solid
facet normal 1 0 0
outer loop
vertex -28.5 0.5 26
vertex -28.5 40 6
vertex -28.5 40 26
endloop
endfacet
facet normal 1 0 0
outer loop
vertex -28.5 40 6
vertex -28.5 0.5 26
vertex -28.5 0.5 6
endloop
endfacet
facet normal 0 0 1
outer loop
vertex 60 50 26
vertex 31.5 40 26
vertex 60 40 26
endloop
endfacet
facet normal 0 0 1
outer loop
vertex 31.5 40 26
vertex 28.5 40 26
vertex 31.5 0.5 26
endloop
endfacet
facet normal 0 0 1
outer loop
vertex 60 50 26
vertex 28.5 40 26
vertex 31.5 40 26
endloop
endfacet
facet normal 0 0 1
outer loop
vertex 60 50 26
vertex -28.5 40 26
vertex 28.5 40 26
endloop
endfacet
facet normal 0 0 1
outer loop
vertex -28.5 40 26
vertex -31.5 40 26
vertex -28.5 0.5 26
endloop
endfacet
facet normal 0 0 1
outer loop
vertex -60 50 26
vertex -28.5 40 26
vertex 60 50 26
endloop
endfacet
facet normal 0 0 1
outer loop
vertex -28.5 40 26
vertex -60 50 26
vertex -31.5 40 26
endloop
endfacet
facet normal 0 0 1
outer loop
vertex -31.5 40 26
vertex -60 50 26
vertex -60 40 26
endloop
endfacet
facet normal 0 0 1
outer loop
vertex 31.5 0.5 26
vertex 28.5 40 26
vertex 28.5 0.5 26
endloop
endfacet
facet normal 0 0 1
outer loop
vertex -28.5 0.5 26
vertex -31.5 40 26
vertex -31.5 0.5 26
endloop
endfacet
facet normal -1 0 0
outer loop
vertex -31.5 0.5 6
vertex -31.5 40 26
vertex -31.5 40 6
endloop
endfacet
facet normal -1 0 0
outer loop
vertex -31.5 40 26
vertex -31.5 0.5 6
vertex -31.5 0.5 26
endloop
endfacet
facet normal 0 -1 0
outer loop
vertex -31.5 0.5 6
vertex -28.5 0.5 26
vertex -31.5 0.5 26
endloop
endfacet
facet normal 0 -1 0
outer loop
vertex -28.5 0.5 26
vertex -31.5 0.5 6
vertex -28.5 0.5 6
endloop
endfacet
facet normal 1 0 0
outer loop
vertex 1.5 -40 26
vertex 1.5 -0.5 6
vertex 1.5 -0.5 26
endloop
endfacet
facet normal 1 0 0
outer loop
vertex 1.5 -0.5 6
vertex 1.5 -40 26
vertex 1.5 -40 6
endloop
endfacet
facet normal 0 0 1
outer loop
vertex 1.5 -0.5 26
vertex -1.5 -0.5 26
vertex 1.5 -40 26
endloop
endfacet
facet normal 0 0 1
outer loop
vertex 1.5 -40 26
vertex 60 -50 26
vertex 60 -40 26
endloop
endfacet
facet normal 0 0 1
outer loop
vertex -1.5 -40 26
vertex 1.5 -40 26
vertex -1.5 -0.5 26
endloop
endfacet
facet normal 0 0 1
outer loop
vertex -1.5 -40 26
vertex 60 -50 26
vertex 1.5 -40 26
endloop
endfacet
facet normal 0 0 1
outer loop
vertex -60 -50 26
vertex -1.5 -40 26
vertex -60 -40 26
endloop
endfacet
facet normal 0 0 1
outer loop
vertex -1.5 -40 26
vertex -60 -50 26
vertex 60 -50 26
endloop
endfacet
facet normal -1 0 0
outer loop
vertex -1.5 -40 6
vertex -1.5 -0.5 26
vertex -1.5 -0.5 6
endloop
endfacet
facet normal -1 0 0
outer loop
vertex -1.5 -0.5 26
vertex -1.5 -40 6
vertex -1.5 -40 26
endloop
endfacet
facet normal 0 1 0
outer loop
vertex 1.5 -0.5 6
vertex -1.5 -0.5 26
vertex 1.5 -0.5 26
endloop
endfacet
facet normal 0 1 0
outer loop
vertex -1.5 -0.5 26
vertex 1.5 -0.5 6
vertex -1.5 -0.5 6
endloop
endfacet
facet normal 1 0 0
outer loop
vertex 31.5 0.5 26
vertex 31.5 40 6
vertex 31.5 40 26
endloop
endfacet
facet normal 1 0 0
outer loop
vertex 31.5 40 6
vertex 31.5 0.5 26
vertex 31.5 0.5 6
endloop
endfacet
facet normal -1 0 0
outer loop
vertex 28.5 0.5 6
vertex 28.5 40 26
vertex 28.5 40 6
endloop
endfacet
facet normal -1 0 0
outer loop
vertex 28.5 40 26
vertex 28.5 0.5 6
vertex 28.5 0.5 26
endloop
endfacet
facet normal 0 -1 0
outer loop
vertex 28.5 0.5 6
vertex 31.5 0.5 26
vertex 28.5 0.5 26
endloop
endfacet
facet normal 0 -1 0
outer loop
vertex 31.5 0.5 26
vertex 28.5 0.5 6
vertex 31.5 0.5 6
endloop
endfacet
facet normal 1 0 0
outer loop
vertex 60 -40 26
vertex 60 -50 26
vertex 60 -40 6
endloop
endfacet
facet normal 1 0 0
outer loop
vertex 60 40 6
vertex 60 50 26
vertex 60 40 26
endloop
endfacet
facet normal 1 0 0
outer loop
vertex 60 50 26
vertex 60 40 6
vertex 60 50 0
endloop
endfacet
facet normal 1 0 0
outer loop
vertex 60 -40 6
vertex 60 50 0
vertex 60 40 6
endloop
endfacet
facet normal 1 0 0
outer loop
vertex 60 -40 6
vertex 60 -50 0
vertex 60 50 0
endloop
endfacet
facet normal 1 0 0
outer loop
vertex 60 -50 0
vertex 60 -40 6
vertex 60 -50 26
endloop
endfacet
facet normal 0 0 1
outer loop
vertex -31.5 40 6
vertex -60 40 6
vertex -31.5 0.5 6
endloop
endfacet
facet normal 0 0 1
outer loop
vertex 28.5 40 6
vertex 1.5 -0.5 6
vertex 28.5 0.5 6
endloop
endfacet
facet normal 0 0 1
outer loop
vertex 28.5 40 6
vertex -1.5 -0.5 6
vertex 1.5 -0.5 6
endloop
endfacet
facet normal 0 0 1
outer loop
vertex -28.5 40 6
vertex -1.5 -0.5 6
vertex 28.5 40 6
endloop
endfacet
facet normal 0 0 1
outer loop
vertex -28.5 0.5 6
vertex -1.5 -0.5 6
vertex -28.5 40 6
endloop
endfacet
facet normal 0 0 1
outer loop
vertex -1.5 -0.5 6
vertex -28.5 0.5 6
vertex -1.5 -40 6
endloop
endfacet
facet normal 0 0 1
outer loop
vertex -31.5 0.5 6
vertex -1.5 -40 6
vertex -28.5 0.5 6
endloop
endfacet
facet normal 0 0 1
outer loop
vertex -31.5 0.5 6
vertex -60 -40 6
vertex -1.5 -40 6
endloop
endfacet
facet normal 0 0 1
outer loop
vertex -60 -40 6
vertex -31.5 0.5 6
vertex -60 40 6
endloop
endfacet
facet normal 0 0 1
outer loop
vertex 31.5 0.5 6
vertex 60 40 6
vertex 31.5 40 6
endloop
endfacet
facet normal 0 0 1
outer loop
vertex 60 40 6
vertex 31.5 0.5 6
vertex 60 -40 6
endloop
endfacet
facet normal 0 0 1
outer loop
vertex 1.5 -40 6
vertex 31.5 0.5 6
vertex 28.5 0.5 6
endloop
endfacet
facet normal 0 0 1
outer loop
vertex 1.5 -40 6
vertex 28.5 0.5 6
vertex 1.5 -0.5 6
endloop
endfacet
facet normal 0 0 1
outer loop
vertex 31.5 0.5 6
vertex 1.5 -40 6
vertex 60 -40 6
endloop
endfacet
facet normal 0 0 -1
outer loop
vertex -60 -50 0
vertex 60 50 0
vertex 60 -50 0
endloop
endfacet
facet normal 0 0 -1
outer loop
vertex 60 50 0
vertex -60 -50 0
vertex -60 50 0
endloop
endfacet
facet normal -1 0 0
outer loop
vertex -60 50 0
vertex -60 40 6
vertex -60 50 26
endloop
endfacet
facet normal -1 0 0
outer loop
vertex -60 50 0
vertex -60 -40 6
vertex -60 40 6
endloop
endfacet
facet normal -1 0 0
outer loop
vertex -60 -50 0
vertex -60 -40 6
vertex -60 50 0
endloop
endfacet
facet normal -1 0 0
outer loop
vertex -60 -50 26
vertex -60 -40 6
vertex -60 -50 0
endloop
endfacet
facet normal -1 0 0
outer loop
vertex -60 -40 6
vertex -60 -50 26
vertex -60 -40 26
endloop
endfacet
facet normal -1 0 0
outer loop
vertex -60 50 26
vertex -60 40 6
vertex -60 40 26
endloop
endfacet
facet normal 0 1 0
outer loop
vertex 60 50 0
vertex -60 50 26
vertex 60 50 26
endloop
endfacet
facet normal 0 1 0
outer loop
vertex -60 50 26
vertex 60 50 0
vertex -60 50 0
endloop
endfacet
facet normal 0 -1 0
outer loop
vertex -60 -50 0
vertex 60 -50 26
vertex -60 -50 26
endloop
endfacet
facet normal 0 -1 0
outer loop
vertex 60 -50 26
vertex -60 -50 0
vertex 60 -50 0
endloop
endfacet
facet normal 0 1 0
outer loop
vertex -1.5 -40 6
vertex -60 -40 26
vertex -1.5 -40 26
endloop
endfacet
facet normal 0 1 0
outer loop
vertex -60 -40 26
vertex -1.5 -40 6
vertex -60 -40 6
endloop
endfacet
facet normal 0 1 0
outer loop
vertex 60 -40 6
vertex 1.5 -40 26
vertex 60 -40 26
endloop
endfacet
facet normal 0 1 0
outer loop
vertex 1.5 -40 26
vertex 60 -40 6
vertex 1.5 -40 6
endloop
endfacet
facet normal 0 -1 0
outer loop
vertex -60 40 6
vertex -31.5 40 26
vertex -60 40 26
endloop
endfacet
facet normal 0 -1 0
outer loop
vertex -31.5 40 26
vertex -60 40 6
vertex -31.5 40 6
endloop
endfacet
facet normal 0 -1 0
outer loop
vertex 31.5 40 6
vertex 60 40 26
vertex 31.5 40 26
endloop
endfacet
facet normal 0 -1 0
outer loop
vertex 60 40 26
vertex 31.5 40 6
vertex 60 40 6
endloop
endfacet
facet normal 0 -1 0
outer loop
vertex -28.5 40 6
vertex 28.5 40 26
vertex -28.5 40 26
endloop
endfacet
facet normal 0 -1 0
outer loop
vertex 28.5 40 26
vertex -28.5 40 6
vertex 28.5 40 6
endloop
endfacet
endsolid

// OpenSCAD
$fn = 32;

// ----------------------------------------------------------------------
// Rib frame 120 x 100 x 26
// 3 ribs at 30 mm pitch, staggered
// ----------------------------------------------------------------------

// --- parameters (mm) ---
frame = [120, 100, 6];  // base plate size (x, y, z)
rail_w = 10;            // side rail width
ribs = 3;               // number of ribs
rib_t = 3;              // rib thickness
rib_h = 20;             // rib height above the base plate
pitch = 30;             // pitch between rib centres

// --- derived feature positions (mm) ---
span = (ribs - 1) * pitch;          // = 60   distance between the outer ribs
origin_x = -span / 2;               // = -30   X of the first rib
rib_len = frame[1] / 2 - rail_w + 0.5;  // = 40.5   length of a staggered rib
rib_y = 0.5 + rib_len / 2;          // = 20.75   Y of a staggered rib centre
row_offset = 2 * rib_y;             // = 41.5   distance between the two rows
feature_centers = [
  [origin_x + 0 * pitch, rib_y],
  [origin_x + 1 * pitch, -rib_y],
  [origin_x + 2 * pitch, rib_y]
];   // rib centre line, drives the rib loop

// base plate, two side rails, then the ribs read straight off feature_centers
union() {
  translate([-frame[0] / 2, -frame[1] / 2, 0]) cube(frame);
  translate([-frame[0] / 2, -frame[1] / 2, 0]) cube([frame[0], rail_w, frame[2] + rib_h]);
  translate([-frame[0] / 2, frame[1] / 2 - rail_w, 0]) cube([frame[0], rail_w, frame[2] + rib_h]);
  for (centre = feature_centers)
    translate([centre[0] - rib_t / 2, centre[1] - rib_len / 2, frame[2] - 1])
      cube([rib_t, rib_len, rib_h + 1]);
}
